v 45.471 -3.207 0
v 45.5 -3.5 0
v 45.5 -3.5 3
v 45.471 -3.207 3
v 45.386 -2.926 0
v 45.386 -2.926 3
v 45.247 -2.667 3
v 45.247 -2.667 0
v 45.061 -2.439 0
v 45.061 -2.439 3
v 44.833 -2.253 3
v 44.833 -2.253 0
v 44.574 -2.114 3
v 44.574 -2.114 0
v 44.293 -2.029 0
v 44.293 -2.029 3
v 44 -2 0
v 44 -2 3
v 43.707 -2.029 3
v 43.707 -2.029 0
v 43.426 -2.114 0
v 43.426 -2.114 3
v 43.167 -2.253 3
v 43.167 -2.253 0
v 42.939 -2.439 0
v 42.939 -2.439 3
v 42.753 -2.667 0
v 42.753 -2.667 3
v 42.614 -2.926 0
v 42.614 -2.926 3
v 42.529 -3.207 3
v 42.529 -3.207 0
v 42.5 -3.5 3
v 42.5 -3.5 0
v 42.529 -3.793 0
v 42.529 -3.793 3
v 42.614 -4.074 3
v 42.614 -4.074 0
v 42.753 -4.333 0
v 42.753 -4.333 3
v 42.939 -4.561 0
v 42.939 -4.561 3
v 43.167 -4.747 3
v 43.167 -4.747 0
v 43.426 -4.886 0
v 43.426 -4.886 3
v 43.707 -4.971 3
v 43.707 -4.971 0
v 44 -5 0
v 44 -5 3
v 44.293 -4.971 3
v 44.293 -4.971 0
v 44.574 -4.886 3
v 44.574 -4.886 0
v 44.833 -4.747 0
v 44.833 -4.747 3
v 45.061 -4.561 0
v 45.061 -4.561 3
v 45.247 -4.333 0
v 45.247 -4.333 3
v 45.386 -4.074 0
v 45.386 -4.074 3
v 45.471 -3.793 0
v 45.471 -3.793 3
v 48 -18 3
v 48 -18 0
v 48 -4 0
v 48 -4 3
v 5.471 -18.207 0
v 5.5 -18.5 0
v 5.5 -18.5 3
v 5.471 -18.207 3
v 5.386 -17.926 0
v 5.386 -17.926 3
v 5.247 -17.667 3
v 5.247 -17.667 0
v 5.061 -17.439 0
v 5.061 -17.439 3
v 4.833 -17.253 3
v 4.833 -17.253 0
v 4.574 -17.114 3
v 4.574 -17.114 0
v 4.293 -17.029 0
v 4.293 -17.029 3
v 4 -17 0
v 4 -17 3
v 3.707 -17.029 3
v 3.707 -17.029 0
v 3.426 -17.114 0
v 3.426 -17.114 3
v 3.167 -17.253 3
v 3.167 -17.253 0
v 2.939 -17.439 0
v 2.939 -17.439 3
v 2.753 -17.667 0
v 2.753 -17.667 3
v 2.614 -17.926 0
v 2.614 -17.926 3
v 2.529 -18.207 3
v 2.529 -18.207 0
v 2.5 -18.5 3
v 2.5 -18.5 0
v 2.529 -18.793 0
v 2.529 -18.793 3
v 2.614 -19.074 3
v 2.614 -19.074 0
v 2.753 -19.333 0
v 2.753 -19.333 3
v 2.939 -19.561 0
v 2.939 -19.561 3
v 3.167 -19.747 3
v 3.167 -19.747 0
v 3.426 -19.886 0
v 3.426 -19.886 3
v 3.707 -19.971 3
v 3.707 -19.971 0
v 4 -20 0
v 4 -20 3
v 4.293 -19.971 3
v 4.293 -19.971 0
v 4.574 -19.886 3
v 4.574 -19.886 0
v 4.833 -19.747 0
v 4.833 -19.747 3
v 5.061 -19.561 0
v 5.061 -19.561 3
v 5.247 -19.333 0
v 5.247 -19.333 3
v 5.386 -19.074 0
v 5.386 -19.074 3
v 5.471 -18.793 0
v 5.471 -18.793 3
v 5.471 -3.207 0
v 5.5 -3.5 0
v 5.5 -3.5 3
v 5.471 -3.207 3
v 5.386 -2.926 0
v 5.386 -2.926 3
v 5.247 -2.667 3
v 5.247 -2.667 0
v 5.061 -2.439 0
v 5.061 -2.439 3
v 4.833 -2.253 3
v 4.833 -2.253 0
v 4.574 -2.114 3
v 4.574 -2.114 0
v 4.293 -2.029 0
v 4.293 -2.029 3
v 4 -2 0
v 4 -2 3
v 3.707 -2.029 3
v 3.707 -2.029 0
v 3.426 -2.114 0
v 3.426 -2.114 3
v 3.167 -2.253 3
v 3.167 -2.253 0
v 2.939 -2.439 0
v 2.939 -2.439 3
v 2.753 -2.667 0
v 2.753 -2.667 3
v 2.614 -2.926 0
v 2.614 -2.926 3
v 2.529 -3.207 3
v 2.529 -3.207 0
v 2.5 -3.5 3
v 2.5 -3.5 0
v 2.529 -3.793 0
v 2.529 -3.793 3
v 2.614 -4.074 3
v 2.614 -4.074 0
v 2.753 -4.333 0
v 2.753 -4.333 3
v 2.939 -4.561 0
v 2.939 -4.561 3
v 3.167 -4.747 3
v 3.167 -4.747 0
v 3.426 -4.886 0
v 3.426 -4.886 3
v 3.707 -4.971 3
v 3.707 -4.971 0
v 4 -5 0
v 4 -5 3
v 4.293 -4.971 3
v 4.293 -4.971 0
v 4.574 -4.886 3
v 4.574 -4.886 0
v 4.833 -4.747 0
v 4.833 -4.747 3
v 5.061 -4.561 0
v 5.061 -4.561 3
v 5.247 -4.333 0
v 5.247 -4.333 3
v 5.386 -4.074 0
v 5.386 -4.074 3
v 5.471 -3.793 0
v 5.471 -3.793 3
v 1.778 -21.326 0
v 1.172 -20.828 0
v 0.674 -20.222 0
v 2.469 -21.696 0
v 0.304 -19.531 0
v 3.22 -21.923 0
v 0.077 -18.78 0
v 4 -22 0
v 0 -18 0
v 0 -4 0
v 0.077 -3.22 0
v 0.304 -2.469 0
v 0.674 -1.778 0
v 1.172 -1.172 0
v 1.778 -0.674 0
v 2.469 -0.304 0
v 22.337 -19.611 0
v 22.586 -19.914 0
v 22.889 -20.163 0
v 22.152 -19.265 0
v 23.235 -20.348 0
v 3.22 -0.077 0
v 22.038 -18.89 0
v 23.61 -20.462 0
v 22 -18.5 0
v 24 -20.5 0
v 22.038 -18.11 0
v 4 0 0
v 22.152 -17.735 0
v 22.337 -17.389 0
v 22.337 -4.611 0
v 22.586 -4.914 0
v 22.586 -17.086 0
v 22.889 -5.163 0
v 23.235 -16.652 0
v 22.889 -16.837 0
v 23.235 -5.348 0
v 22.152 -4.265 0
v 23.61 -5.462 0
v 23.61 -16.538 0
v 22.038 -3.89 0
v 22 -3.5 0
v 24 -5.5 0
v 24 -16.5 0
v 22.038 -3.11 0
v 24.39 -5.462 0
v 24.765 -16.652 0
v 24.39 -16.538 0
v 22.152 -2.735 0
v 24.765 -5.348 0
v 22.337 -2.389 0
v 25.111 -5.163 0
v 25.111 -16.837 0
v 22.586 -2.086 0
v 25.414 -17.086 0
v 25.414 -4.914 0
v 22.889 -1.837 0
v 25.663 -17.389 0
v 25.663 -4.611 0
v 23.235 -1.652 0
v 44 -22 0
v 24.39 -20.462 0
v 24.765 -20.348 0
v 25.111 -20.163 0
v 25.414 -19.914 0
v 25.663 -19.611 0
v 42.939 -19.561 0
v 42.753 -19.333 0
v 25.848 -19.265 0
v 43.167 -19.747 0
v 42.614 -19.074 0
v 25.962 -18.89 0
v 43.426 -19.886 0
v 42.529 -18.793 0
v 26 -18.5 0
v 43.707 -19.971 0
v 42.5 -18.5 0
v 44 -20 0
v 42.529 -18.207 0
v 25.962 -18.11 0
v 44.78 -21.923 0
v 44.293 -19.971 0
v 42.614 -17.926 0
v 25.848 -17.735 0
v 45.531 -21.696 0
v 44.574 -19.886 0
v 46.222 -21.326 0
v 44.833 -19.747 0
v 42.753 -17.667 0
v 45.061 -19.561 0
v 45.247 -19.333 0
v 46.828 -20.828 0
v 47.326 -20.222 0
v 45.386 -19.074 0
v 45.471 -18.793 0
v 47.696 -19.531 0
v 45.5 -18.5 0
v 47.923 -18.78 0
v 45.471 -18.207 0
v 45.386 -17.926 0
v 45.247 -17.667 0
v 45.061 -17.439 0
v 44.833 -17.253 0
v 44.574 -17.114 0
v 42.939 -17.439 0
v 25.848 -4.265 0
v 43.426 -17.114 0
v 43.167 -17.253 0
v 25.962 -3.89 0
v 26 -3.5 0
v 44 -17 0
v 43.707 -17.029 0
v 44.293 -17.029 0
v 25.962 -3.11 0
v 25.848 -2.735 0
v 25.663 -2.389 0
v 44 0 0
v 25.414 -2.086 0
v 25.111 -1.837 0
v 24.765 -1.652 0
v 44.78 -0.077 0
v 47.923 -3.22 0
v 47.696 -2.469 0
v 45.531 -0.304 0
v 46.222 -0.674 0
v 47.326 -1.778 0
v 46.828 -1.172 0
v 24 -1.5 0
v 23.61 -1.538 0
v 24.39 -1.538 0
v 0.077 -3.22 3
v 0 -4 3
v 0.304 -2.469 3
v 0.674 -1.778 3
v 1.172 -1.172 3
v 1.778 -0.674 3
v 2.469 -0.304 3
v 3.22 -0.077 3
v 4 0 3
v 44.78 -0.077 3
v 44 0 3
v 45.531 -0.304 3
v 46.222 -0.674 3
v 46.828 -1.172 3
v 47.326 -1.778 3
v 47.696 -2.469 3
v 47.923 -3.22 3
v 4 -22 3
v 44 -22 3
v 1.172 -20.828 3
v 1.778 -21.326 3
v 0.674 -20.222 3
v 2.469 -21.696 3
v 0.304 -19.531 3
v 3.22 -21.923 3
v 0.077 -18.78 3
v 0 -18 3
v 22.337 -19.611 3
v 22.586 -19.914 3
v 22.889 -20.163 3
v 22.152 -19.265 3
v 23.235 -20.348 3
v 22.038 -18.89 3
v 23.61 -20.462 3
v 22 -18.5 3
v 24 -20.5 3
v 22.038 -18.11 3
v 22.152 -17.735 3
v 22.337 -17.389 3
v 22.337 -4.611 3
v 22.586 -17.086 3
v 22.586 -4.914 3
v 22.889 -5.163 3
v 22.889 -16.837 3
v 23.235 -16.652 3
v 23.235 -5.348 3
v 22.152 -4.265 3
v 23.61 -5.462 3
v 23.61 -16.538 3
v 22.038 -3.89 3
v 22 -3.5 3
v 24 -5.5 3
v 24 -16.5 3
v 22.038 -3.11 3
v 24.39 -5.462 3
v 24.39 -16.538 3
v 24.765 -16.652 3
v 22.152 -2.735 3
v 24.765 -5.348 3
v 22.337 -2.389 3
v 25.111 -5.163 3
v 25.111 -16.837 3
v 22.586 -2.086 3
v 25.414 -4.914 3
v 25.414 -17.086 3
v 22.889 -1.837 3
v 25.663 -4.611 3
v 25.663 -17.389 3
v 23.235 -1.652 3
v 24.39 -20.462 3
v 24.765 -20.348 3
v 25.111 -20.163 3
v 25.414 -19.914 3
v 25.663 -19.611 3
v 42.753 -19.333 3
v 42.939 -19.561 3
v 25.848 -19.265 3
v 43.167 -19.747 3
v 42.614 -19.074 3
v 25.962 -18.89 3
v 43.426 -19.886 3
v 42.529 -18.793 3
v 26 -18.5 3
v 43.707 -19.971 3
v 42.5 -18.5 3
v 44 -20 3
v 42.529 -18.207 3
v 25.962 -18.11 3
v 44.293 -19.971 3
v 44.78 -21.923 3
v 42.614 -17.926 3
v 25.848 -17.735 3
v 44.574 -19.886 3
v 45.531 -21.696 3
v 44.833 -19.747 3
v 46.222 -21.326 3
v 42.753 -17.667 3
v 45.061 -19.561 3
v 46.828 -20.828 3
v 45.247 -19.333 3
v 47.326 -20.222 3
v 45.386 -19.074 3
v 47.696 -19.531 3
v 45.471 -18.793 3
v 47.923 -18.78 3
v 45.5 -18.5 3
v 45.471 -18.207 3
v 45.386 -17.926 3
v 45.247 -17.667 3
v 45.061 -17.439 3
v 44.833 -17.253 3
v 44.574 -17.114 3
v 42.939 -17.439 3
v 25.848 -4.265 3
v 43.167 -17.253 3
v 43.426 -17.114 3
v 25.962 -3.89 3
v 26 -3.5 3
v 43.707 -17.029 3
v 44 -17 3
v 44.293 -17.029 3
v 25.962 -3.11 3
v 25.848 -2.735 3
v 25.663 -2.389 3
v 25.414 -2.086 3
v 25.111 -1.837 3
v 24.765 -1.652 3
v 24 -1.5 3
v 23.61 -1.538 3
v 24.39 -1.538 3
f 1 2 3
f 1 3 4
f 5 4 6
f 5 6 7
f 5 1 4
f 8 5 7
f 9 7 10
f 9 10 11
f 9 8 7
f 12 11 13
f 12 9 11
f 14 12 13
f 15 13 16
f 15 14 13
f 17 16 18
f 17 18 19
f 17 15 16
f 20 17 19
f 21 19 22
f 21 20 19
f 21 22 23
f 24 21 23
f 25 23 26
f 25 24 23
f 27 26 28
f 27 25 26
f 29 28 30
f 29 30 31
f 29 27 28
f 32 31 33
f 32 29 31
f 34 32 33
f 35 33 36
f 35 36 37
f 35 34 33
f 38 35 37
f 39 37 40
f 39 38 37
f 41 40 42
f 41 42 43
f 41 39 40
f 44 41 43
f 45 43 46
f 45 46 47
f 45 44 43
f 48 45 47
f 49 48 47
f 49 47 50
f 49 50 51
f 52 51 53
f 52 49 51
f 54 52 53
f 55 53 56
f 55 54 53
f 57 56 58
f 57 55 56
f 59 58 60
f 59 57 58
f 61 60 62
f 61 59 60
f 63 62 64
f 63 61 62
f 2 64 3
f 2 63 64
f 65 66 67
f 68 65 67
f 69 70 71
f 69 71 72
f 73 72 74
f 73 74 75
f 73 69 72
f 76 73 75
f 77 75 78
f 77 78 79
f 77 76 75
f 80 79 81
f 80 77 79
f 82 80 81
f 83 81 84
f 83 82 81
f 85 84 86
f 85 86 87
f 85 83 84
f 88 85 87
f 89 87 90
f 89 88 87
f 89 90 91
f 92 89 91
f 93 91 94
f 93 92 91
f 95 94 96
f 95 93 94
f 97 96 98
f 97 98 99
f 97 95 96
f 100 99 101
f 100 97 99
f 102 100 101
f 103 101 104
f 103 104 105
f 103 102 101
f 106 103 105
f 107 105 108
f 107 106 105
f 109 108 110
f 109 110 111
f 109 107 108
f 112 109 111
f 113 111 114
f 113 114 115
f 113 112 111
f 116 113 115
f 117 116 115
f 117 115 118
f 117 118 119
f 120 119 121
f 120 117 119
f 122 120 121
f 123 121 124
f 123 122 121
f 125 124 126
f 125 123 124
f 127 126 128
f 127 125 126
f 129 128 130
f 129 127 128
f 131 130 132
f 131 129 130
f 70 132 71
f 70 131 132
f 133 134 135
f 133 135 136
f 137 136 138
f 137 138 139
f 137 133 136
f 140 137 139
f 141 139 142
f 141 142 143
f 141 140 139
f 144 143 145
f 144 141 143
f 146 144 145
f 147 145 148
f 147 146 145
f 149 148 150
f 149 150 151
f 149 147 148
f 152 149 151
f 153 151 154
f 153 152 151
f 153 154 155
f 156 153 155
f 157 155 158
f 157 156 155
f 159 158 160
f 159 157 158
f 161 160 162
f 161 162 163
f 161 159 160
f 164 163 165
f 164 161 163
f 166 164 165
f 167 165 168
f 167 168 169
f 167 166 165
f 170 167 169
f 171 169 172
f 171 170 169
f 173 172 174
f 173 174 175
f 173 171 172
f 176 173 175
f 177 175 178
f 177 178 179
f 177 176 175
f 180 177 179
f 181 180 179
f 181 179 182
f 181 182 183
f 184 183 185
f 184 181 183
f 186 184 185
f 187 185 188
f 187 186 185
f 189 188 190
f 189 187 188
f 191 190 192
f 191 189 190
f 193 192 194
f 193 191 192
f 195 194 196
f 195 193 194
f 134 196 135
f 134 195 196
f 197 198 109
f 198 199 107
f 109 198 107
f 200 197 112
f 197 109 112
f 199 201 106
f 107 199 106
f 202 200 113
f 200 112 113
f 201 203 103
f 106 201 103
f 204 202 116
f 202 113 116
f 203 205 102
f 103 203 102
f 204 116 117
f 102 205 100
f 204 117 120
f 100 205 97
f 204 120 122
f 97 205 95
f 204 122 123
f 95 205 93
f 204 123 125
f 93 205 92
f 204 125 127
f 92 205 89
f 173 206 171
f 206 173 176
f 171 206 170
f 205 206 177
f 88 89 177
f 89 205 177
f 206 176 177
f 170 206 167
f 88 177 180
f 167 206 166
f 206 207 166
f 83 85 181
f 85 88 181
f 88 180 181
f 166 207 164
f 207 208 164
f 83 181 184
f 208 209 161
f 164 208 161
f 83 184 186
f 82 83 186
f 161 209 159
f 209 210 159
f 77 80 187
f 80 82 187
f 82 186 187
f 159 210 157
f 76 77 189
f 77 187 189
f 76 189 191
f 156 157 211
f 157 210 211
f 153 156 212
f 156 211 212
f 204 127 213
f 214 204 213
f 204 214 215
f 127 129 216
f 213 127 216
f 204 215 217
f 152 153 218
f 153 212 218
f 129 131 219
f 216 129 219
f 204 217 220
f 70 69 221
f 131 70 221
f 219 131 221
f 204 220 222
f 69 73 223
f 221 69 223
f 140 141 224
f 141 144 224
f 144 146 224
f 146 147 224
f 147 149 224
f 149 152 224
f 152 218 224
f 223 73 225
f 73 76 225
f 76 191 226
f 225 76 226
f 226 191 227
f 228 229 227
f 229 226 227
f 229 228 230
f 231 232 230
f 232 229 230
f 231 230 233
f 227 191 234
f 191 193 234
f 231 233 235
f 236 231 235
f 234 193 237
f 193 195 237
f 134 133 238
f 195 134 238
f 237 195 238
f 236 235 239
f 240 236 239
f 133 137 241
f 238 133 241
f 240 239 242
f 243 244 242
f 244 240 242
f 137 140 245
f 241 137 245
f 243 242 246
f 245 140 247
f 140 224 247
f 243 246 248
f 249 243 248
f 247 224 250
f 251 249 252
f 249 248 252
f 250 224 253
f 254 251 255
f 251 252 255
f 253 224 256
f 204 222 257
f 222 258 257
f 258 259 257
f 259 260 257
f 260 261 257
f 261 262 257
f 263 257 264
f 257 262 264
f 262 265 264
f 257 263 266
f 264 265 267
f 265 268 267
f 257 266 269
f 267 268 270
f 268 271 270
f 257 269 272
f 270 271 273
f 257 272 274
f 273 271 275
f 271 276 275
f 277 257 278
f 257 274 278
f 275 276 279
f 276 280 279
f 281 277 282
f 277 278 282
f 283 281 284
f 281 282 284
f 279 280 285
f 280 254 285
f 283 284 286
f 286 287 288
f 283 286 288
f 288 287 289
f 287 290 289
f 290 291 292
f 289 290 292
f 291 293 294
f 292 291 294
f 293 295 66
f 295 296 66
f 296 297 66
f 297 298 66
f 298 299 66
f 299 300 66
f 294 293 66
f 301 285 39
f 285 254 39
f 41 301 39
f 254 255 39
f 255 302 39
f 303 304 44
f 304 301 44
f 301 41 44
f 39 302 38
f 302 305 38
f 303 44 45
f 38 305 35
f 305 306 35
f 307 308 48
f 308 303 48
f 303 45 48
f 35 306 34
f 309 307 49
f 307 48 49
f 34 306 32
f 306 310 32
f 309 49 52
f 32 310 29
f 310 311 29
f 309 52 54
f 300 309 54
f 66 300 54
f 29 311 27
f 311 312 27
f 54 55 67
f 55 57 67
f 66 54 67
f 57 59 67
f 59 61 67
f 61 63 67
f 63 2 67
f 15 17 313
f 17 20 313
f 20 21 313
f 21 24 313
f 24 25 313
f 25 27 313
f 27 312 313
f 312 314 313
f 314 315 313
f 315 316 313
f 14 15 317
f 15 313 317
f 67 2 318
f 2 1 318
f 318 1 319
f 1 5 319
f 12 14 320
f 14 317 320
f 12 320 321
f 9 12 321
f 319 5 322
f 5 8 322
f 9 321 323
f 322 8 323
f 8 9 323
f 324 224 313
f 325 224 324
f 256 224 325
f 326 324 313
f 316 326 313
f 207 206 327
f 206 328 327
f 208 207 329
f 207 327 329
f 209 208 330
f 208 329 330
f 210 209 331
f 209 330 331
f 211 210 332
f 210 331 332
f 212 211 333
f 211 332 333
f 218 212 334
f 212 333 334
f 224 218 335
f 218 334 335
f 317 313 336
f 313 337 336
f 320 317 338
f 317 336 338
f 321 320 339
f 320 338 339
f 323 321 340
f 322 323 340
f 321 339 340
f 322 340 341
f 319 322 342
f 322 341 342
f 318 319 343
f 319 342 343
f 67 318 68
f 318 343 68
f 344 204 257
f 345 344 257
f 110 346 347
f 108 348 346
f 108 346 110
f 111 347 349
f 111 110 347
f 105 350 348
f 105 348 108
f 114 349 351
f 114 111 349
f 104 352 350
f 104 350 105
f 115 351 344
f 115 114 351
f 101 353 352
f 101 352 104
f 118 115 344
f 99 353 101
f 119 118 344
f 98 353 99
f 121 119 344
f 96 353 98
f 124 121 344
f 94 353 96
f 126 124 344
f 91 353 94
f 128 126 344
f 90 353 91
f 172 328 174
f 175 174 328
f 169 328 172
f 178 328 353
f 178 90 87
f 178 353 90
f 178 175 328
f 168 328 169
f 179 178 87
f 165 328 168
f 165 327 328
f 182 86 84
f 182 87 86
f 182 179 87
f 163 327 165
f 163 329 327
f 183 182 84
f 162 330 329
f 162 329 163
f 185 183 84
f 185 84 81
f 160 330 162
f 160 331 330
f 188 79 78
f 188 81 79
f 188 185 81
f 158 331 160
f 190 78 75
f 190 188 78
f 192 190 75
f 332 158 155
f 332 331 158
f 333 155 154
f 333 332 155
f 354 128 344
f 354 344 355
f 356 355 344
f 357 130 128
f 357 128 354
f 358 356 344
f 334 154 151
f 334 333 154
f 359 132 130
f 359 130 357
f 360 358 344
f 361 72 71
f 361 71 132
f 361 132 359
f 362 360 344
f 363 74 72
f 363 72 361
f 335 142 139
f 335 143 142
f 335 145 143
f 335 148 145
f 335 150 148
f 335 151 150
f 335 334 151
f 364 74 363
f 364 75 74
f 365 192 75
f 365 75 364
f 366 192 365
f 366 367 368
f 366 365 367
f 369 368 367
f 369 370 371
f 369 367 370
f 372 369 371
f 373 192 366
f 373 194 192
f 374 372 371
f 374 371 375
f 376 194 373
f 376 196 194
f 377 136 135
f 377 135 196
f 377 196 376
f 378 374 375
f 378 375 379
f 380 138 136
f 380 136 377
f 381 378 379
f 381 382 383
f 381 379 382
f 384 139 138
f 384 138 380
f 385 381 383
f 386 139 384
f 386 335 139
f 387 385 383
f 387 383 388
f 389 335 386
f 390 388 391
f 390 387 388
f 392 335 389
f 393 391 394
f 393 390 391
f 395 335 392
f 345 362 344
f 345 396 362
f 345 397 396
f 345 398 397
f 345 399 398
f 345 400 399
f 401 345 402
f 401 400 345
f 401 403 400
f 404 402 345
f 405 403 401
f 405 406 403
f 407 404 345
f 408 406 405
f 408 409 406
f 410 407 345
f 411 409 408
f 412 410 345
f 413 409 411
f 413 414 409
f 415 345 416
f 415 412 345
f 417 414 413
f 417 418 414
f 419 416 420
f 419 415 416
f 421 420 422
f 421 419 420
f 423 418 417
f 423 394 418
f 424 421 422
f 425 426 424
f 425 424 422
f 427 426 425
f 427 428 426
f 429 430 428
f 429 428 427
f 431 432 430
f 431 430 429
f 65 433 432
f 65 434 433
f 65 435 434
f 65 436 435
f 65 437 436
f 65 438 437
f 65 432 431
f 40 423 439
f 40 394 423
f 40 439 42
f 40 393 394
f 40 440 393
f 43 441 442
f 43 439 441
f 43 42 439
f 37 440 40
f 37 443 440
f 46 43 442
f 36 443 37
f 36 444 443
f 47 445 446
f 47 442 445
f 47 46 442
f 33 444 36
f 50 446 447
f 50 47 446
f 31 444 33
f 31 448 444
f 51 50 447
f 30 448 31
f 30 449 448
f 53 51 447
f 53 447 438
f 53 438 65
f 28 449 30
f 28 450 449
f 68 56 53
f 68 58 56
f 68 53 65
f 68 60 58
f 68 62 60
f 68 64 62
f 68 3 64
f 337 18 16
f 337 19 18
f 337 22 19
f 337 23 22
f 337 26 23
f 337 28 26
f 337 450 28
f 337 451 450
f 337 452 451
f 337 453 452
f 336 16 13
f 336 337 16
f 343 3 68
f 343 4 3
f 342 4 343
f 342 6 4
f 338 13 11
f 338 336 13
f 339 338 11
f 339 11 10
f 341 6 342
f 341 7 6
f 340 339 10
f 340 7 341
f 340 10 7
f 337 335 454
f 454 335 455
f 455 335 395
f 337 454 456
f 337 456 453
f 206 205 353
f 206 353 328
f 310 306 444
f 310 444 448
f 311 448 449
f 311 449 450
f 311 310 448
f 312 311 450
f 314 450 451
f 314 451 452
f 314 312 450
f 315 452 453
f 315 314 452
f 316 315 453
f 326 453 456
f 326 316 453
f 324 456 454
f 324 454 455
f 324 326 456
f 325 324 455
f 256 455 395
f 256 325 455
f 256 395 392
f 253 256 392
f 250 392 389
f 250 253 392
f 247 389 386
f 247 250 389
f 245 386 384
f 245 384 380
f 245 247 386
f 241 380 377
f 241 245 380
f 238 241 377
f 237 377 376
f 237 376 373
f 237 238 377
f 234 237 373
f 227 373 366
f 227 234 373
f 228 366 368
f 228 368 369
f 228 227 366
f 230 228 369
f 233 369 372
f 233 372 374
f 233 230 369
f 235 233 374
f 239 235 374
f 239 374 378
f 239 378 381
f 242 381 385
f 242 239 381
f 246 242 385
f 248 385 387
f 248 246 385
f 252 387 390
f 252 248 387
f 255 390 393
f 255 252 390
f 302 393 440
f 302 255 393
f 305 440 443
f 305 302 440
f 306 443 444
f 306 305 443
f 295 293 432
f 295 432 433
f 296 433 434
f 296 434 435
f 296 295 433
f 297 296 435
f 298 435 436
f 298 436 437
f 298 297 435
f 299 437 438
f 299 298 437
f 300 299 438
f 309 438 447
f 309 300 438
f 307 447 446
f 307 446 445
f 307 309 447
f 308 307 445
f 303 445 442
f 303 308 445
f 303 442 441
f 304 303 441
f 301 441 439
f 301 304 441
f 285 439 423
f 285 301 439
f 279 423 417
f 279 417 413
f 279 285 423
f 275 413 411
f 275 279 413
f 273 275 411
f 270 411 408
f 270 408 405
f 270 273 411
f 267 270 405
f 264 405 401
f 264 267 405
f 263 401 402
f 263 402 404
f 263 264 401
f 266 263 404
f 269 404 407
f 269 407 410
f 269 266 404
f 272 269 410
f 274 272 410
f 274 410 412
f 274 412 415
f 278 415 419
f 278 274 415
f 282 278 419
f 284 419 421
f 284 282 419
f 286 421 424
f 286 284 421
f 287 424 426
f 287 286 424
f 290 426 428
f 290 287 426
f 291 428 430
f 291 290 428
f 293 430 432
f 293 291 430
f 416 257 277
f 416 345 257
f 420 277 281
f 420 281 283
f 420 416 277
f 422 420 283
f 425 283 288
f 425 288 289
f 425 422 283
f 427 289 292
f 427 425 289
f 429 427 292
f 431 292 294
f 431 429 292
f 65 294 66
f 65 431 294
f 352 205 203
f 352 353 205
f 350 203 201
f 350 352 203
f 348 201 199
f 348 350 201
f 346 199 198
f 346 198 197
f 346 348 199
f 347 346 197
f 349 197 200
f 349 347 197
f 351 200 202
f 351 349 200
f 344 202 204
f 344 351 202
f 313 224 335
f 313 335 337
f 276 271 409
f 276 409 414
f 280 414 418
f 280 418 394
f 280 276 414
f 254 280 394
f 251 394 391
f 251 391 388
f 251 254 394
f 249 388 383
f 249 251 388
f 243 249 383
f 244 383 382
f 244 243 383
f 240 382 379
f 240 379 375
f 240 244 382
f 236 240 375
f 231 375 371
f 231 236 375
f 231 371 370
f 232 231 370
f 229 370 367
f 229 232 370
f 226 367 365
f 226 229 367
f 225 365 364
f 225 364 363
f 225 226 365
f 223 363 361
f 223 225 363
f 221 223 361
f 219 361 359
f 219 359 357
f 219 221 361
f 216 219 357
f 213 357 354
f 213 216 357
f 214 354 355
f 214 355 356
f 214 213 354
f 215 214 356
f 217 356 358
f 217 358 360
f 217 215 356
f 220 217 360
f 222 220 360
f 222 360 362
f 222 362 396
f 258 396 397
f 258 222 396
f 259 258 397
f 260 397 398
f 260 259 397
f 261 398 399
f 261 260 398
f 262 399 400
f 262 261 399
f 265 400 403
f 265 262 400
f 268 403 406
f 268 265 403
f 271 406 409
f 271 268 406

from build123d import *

# Parameters (mm, degrees)
ESQUISSE1_W        = 48
ESQUISSE1_H        = 22
ESQUISSE1_R        = 2
ESQUISSE1_R_2      = 1.5
BOSS_EXTRU_1_DEPTH = 3
CONG_1_R           = 4


with BuildPart() as part:
    # Esquisse1 → Boss.-Extru.1 (new body)
    with BuildSketch(Plane.XY):
        with Locations((24, -11)):
            Rectangle(ESQUISSE1_W, ESQUISSE1_H)
        with Locations((24, -3.5)):
            Circle(ESQUISSE1_R, mode=Mode.SUBTRACT)
        with Locations((24, -18.5)):
            Circle(ESQUISSE1_R, mode=Mode.SUBTRACT)
        with Locations((4, -3.5)):
            Circle(ESQUISSE1_R_2, mode=Mode.SUBTRACT)
        with Locations((44, -3.5)):
            Circle(ESQUISSE1_R_2, mode=Mode.SUBTRACT)
        with Locations((44, -18.5)):
            Circle(ESQUISSE1_R_2, mode=Mode.SUBTRACT)
        with Locations((4, -18.5)):
            Circle(ESQUISSE1_R_2, mode=Mode.SUBTRACT)
    extrude(amount=BOSS_EXTRU_1_DEPTH)

    # Congé1
    cong_1_edges = [part.edges().sort_by_distance(p)[0] for p in [
        (0, 0, 1.5),
        (48, 0, 1.5),
        (48, -22, 1.5),
        (0, -22, 1.5),
    ]]
    fillet(cong_1_edges, radius=CONG_1_R)


solid = part.part
